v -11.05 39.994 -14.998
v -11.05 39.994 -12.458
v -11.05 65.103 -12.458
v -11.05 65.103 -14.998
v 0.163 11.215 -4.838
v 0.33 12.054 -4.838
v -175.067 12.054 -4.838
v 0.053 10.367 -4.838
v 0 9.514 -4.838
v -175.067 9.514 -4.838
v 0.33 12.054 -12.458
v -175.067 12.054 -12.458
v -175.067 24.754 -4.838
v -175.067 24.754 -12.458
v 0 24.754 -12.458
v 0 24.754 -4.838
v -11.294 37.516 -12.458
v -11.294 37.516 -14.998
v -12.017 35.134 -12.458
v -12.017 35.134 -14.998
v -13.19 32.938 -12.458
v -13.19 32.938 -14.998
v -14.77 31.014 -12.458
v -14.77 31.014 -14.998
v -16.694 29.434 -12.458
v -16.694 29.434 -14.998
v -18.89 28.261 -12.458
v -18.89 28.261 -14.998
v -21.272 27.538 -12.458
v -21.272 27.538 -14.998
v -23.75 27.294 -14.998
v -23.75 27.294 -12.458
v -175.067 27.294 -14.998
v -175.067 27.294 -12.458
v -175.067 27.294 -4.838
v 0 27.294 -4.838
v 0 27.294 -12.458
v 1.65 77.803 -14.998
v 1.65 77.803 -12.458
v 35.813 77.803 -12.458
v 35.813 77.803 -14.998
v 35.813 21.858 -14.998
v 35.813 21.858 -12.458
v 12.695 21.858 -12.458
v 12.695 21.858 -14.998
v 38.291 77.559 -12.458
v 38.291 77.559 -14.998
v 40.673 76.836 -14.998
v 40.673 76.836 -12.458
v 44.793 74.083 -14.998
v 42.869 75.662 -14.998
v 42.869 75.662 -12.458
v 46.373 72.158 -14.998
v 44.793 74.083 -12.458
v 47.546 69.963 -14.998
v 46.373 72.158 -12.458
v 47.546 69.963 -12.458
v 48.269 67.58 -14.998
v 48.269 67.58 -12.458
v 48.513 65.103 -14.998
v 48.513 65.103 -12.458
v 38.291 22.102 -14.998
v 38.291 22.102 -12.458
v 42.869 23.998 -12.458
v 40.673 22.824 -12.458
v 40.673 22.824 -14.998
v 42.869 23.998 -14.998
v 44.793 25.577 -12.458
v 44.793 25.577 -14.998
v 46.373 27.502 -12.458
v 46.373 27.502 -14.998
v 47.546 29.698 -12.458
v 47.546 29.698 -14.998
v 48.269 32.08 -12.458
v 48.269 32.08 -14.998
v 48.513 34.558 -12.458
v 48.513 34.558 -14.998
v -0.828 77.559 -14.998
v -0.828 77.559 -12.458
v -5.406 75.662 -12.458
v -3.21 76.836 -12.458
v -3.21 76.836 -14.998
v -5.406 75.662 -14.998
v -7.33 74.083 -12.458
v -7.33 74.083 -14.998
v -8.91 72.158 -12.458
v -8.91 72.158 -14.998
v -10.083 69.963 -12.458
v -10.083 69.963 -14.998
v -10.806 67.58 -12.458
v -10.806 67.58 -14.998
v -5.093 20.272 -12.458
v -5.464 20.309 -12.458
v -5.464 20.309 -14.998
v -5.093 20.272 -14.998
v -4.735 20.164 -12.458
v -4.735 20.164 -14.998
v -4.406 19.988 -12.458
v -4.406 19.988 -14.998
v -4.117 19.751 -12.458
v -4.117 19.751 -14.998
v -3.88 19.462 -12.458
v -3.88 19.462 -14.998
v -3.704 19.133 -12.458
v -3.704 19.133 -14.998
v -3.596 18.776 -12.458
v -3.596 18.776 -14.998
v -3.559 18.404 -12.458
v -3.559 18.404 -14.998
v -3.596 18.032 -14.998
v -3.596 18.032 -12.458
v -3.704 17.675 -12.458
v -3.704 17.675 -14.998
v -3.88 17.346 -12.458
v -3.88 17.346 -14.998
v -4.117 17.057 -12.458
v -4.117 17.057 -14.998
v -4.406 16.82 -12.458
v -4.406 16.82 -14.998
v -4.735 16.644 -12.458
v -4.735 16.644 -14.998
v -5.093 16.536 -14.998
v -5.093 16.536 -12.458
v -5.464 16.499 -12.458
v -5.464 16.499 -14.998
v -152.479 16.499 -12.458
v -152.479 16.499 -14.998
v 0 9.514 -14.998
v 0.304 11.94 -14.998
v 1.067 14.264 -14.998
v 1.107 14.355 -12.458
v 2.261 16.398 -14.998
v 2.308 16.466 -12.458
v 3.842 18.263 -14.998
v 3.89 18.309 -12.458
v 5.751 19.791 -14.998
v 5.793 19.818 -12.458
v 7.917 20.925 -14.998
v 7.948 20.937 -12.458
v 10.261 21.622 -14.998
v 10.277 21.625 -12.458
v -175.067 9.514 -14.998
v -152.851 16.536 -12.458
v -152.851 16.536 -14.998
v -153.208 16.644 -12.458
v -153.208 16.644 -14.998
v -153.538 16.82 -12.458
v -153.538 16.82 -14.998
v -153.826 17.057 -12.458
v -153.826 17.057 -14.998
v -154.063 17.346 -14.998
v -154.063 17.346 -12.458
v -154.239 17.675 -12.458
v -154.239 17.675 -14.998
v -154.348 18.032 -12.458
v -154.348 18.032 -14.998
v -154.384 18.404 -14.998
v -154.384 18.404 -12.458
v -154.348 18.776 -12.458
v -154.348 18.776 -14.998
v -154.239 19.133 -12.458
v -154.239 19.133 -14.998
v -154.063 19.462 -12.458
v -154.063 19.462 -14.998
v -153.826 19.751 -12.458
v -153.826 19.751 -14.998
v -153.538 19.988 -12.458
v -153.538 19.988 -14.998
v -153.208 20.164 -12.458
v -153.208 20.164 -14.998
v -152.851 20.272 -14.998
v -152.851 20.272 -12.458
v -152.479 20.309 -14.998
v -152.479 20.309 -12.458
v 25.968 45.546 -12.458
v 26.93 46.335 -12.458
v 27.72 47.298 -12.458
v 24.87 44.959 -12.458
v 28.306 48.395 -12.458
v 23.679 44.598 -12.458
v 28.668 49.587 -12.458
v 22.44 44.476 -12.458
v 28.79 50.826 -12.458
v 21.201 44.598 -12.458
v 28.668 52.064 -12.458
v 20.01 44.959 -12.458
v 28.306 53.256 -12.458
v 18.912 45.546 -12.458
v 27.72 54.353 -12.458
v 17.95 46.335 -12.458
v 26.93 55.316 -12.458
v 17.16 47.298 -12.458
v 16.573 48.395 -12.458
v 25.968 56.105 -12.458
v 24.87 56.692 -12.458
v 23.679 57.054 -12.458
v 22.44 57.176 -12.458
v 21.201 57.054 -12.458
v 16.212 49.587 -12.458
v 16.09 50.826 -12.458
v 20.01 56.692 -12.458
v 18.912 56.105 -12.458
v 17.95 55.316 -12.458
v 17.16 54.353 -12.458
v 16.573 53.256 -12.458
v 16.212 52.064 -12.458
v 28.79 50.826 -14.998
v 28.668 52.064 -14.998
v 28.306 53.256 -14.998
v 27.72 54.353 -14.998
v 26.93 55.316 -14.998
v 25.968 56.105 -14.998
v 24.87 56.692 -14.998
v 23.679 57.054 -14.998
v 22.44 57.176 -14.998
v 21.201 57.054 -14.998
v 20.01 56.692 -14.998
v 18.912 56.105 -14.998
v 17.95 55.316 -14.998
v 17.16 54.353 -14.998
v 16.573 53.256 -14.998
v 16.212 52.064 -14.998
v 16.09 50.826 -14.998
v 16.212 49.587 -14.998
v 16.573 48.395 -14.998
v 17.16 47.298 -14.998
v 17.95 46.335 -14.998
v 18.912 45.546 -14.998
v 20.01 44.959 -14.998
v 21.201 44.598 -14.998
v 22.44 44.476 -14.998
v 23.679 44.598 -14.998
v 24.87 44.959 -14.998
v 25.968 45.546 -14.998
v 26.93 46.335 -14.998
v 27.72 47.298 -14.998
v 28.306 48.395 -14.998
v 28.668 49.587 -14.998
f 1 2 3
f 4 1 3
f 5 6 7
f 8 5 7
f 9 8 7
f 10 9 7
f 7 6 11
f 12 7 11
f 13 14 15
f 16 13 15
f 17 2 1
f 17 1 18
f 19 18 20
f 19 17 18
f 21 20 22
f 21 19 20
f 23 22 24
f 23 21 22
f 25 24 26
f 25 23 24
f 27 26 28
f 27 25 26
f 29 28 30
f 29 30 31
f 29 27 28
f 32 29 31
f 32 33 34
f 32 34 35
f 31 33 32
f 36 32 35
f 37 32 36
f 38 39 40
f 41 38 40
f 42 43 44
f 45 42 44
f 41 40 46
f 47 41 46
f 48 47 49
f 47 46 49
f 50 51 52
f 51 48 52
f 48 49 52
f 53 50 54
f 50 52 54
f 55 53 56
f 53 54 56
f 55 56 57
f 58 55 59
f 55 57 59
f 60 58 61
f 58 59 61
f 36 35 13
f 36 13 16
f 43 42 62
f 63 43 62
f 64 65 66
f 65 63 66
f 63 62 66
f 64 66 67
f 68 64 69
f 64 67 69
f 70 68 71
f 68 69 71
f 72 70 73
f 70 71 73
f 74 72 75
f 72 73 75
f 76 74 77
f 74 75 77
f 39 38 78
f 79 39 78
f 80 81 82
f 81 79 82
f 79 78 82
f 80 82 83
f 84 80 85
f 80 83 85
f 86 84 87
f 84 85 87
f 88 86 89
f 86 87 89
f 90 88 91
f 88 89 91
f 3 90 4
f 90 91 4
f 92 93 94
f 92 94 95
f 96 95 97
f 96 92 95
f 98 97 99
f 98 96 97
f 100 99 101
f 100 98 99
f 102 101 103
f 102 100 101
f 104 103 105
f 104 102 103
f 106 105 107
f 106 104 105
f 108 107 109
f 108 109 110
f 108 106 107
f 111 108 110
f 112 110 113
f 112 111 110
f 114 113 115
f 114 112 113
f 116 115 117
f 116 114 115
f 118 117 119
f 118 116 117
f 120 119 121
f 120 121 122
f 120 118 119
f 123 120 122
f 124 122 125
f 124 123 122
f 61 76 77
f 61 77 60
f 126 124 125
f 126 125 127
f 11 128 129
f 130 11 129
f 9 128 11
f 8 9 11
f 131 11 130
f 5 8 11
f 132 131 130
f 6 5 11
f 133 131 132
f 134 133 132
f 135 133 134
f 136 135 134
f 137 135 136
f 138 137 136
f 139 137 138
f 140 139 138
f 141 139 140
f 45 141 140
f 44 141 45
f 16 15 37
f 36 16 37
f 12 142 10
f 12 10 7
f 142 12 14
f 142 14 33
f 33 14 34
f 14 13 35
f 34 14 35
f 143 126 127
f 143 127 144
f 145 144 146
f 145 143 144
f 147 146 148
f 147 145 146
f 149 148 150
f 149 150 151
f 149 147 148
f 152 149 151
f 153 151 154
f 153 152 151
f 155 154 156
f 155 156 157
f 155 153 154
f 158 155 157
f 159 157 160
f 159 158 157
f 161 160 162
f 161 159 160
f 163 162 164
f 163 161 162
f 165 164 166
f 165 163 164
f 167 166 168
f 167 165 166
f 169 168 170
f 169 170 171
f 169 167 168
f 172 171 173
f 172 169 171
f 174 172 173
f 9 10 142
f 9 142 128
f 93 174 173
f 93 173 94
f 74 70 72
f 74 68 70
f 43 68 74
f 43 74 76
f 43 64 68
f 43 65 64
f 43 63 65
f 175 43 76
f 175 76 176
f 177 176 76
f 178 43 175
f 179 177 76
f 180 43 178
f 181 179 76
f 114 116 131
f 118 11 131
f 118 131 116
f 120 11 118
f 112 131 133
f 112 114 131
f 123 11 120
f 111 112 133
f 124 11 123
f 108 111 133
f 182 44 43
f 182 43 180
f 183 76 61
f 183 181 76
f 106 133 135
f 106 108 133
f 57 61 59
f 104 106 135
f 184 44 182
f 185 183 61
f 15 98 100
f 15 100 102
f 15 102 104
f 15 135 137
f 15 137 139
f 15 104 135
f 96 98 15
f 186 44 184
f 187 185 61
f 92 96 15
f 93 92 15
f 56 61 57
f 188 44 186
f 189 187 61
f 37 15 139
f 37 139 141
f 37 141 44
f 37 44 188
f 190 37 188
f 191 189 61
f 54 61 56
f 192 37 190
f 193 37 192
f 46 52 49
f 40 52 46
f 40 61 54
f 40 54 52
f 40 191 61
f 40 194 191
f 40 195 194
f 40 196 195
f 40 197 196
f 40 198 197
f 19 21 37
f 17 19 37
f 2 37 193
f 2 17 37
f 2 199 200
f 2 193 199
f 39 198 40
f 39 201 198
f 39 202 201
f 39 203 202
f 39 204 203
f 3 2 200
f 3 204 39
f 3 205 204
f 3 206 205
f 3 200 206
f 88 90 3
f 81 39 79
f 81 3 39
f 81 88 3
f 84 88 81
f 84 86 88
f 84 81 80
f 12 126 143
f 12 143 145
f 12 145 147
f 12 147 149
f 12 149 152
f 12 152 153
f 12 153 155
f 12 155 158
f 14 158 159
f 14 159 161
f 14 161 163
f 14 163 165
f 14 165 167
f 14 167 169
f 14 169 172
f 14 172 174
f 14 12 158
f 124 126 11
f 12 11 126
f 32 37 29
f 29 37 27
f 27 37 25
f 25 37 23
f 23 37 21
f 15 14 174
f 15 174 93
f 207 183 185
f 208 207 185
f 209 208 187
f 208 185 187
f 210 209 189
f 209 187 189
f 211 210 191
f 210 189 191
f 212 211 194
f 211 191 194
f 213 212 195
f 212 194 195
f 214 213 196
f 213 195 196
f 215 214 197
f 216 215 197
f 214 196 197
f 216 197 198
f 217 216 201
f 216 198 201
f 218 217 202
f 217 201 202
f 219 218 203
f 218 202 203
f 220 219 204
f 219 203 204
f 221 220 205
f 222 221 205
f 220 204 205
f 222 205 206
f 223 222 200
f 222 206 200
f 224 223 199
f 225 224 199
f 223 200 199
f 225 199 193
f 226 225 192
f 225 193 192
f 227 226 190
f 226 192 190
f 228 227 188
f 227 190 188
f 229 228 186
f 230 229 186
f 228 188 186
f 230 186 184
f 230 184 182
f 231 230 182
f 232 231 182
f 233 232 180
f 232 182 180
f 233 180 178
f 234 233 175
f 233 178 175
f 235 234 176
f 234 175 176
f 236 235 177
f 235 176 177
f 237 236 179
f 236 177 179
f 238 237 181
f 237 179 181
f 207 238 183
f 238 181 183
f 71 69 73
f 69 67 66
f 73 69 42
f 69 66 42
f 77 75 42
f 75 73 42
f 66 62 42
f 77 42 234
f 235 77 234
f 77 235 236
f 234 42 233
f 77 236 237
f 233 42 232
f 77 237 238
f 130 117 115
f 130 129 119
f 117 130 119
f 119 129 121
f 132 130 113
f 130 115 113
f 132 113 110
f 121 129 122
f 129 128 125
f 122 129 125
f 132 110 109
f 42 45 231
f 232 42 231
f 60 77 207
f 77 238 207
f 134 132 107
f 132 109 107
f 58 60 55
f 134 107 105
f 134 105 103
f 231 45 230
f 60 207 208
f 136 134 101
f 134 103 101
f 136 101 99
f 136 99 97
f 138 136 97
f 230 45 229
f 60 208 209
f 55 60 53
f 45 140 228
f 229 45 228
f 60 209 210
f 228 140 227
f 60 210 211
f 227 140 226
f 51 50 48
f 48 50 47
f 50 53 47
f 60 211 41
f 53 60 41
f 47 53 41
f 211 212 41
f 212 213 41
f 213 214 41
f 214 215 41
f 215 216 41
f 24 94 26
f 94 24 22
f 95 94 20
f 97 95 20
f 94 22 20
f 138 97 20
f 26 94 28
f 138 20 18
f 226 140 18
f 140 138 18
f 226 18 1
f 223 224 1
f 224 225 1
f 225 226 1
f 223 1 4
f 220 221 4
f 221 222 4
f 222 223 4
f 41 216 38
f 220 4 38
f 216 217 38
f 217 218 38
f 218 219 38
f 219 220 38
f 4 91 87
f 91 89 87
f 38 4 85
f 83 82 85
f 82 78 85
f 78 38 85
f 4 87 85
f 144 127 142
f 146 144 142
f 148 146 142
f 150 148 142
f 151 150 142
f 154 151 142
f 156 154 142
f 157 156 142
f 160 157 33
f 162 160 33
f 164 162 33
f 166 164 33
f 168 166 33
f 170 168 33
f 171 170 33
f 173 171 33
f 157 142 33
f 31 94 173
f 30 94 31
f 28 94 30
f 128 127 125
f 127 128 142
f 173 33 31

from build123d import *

# Parameters (mm, degrees)
BOSS_EXTRUDE1_DEPTH = 2.54
SKETCH2_R           = 6.35
CUT_EXTRUDE1_DEPTH  = 2.54
SKETCH3_W           = 175.067056309
SKETCH3_H           = 2.54
BOSS_EXTRUDE2_DEPTH = 7.62
SKETCH4_W           = 175.067056309
SKETCH4_H           = 29.21
SKETCH4_W_2         = 164.016975536
SKETCH4_H_2         = 66.475239383
SKETCH4_W_3         = 84.822418372
SKETCH4_H_3         = 89.286756182
CUT_EXTRUDE2_DEPTH  = 2.54
FILLET1_R           = 12.7


with BuildPart() as part:
    # Sketch1 → Boss-Extrude1 (new body)
    with BuildSketch(Plane.XY.offset(-12.457776114)):
        Polygon((-175.067056309, 77.80274772), (129.732943691, 77.80274772), (129.732943691, 21.857628122), (0, 21.857628122), (0, -19.695936064), (-175.067056309, -19.695936064), align=None)
        with BuildLine():
            Line((-152.479240823, 20.309063936), (-5.464407031, 20.309063936))
            ThreePointArc((-5.464407031, 20.309063936), (-3.559407031, 18.404063936), (-5.464407031, 16.499063936))
            Line((-5.464407031, 16.499063936), (-152.479240823, 16.499063936))
            ThreePointArc((-152.479240823, 16.499063936), (-154.384240823, 18.404063936), (-152.479240823, 20.309063936))
        make_face(mode=Mode.SUBTRACT)
    extrude(amount=-BOSS_EXTRUDE1_DEPTH)

    # Sketch2 → Cut-Extrude1 (cut)
    with BuildSketch(Plane.XY.offset(-12.457776114)):
        with Locations((22.439796045, 50.825535486)):
            Circle(SKETCH2_R)
    extrude(amount=-CUT_EXTRUDE1_DEPTH, mode=Mode.SUBTRACT)

    # Sketch3 → Boss-Extrude2 (add)
    with BuildSketch(Plane.XY.offset(-12.457776114)):
        with Locations((-87.533528155, 26.024063936)):
            Rectangle(SKETCH3_W, SKETCH3_H)
        with Locations((-87.533528155, 10.784063936)):
            Rectangle(SKETCH3_W, SKETCH3_H)
    extrude(amount=BOSS_EXTRUDE2_DEPTH)

    # Sketch4 → Cut-Extrude2 (cut)
    with BuildSketch(Plane.XY.offset(-12.457776114)):
        with Locations((-87.533528155, -5.090936064)):
            Rectangle(SKETCH4_W, SKETCH4_H)
        with Locations((-93.058568541, 60.531683628)):
            Rectangle(SKETCH4_W_2, SKETCH4_H_2)
        with Locations((90.924098408, 47.502895008)):
            Rectangle(SKETCH4_W_3, SKETCH4_H_3)
    extrude(amount=-CUT_EXTRUDE2_DEPTH, mode=Mode.SUBTRACT)

    # Fillet1
    # the kernel refuses this fillet: 12.7 mm, written as the material it adds along each edge
    with BuildSketch(Plane(origin=(-11.050080773, 27.294063936, -12.457776114), x_dir=(0, 1, 0), z_dir=(0, 0, -1))) as fillet1_piece_1:
        with BuildLine():
            CenterArc((FILLET1_R, -FILLET1_R), FILLET1_R, 90, 90)
            Line((0, -FILLET1_R), (0, 0))
            Line((0, 0), (FILLET1_R, 0))
        make_face()
    extrude(amount=2.54)
    with BuildSketch(Plane(origin=(0, 21.857628122, 19.279716847), x_dir=(0, -1, 0), z_dir=(0, 0, -1))) as fillet1_piece_2_section:
        with BuildLine():
            CenterArc((12.7, -12.694997184), FILLET1_R, 91.608263763, 88.391736237)
            Line((0, -12.694997184), (0, 0))
            Line((0, 0), (12.343564187, 0))
        make_face()
    fillet1_piece_2 = extrude(amount=34.277492961, mode=Mode.PRIVATE)
    fillet1_piece_2 = split(fillet1_piece_2, bisect_by=Plane(origin=(0, 12.054063936, 19.279716847), z_dir=(0, -1, 0)), keep=Keep.TOP, mode=Mode.PRIVATE)
    fillet1_piece_2 = split(fillet1_piece_2, bisect_by=Plane(origin=(0, 21.857628122, -4.837776114), z_dir=(0, 0, -1)), keep=Keep.TOP, mode=Mode.PRIVATE)
    add(fillet1_piece_2)
    with BuildSketch(Plane(origin=(0, 21.857628122, -12.457776114), x_dir=(0, -1, 0), z_dir=(0, 0, -1))) as fillet1_piece_3:
        with BuildLine():
            CenterArc((12.7, -12.694997184), FILLET1_R, 91.608263763, 88.391736237)
            Line((0, -12.694997184), (0, 0))
            Line((0, 0), (12.343564187, 0))
        make_face()
    extrude(amount=2.54)
    # the kernel refuses this fillet: 12.7 mm, written as the material it takes off along each edge
    with BuildSketch(Plane(origin=(48.512889222, 21.857628122, -46.747776114), x_dir=(-1, 0, 0), z_dir=(0, 0, 1)), Plane(origin=(48.512889222, 77.80274772, 19.292223886), x_dir=(-1, 0, 0), z_dir=(0, 0, -1)), Plane(origin=(-11.050080773, 77.80274772, -46.747776114), x_dir=(1, 0, 0), z_dir=(0, 0, 1))) as fillet1_2_piece_1:
        with BuildLine():
            CenterArc((FILLET1_R, -FILLET1_R), FILLET1_R, 90, 90)
            Line((0, -FILLET1_R), (0, 0))
            Line((0, 0), (FILLET1_R, 0))
        make_face()
    extrude(amount=66.04, mode=Mode.SUBTRACT)


solid = part.part
